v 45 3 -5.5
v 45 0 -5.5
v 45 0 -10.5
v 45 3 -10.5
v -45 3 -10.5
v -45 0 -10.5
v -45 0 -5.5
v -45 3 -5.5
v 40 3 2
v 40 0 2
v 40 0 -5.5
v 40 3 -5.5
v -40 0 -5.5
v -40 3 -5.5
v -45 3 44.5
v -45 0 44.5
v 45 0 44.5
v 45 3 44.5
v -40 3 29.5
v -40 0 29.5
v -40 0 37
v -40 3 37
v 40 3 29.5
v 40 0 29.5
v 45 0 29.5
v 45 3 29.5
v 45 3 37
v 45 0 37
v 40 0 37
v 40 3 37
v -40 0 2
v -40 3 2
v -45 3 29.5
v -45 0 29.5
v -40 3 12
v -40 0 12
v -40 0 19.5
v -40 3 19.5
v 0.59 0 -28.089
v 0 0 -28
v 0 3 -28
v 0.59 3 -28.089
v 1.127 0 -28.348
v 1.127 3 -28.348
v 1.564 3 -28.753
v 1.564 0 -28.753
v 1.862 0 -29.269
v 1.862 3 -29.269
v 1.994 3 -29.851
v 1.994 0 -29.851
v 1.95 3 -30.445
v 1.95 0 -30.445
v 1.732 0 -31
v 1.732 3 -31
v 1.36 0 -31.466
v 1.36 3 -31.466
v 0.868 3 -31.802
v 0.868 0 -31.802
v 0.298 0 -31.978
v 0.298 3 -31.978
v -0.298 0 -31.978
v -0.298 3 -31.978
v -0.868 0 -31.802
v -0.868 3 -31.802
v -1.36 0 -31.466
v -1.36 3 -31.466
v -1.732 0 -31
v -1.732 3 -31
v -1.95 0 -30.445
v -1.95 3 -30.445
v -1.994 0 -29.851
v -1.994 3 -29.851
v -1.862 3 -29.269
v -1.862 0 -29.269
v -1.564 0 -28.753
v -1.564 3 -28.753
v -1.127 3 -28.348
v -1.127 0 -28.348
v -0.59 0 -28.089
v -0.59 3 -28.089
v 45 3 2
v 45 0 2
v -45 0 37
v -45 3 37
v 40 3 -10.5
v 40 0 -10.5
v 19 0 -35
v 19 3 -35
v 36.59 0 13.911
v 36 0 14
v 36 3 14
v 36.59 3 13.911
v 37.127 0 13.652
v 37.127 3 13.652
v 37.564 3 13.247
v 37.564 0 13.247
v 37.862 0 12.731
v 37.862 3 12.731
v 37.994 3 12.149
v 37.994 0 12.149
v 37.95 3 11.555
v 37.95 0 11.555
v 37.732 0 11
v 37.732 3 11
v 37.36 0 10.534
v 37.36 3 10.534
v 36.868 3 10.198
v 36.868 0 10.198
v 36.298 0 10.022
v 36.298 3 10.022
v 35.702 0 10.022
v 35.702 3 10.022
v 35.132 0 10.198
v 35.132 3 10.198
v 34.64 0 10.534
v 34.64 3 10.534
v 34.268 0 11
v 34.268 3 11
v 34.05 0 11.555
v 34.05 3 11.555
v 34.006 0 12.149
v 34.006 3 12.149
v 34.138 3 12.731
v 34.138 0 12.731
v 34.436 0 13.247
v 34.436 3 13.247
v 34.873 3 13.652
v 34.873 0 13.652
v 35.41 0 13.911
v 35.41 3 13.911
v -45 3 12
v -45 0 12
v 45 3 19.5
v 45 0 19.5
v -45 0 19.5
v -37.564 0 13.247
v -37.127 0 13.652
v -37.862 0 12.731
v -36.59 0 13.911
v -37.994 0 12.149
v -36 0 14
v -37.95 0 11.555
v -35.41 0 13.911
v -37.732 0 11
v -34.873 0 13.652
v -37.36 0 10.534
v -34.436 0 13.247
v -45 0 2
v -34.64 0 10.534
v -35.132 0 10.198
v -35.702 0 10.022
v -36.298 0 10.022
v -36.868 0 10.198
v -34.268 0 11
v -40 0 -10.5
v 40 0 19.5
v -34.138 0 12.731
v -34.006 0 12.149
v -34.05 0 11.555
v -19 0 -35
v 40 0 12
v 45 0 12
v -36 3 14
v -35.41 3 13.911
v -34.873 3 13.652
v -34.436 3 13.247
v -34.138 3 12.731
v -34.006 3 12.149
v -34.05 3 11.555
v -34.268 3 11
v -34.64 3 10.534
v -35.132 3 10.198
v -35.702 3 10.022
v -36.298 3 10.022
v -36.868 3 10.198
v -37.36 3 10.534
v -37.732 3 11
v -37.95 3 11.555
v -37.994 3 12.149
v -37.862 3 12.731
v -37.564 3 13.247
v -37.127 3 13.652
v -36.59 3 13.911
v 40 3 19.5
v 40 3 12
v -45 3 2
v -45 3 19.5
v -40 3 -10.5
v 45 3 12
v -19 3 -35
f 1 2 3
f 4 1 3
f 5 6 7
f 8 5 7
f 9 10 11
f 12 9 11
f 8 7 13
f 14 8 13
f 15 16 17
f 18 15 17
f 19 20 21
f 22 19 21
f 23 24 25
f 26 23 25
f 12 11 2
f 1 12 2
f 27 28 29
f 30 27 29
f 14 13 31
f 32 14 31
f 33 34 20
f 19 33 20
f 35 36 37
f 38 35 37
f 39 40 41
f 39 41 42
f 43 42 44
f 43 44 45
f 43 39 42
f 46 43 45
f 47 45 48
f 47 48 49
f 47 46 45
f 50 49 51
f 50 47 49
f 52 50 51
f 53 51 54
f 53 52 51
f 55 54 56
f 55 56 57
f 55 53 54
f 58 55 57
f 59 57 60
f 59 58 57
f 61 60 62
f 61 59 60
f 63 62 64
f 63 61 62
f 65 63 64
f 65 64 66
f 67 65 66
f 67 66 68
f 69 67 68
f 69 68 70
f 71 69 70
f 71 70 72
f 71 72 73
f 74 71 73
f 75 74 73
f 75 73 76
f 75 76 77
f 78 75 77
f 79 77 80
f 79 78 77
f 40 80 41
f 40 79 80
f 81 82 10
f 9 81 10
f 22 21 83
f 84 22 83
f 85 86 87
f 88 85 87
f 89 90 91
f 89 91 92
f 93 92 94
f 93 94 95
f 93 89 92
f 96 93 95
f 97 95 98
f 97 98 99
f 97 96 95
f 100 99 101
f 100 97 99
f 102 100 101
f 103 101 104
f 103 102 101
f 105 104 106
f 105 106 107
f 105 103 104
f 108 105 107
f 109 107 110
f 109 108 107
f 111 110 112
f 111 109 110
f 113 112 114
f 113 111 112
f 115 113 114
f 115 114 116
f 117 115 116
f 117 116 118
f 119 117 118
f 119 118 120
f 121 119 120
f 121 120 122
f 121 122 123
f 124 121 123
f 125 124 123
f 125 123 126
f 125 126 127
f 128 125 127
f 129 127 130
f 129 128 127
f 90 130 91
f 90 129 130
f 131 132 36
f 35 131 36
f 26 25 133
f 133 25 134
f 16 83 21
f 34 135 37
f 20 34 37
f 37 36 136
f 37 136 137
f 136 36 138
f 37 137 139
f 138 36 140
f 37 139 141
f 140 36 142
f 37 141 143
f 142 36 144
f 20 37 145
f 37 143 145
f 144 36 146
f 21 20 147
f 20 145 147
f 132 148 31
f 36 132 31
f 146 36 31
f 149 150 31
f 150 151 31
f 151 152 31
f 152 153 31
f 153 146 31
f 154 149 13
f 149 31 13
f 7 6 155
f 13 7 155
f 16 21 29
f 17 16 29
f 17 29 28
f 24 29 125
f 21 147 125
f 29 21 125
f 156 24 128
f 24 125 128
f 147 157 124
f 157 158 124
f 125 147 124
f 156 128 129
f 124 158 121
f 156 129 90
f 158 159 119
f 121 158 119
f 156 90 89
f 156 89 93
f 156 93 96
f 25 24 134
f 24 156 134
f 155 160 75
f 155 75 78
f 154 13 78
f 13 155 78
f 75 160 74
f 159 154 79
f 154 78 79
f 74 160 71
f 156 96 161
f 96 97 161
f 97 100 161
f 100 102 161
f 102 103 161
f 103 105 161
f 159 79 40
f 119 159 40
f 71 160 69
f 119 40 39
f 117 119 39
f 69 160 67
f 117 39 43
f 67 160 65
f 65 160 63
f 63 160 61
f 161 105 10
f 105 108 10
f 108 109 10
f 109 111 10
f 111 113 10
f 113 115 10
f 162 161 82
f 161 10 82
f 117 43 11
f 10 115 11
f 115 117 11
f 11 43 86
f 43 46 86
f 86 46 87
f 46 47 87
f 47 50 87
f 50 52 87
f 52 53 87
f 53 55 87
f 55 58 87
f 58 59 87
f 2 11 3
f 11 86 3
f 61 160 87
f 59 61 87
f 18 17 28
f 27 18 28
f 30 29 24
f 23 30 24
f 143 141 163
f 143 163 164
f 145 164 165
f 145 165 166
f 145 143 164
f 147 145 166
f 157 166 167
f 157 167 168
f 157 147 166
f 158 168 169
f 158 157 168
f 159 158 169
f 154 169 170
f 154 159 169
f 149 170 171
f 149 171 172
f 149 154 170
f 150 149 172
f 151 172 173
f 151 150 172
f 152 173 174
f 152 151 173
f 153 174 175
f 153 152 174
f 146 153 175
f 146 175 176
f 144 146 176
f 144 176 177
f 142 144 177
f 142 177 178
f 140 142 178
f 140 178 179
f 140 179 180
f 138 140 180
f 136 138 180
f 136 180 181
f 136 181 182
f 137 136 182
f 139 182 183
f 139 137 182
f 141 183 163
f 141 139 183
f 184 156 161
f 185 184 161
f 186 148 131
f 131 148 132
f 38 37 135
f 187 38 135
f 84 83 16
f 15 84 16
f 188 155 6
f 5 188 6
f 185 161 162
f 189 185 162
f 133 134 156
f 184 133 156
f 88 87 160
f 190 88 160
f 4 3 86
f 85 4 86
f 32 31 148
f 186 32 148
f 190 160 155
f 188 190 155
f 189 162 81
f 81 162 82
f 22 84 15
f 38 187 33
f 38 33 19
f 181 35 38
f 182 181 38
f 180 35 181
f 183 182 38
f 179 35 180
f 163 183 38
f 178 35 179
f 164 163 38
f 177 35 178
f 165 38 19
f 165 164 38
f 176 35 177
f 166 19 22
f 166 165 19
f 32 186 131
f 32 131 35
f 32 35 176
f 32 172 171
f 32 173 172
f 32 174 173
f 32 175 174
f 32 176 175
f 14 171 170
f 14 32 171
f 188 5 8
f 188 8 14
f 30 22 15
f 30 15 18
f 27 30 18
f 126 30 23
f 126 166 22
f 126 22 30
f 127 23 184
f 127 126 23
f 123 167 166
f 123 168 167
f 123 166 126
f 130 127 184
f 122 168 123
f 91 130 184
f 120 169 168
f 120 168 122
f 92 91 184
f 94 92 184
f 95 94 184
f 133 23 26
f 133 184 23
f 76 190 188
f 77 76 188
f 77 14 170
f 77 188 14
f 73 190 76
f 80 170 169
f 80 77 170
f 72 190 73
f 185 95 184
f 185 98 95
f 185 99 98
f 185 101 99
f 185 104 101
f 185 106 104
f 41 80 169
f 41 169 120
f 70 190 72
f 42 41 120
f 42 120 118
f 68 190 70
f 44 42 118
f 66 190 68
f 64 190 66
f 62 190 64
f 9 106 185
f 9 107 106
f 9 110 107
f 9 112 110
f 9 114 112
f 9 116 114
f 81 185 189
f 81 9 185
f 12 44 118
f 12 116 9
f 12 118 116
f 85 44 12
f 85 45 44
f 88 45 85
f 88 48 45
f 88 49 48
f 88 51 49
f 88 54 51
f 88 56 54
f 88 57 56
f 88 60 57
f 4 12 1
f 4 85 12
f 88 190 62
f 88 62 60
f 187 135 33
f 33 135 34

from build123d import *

# Parameters (mm, degrees)
SKETCH1_R           = 2
BOSS_EXTRUDE1_DEPTH = 3


with BuildPart() as part:
    # Sketch1 → Boss-Extrude1 (new body)
    with BuildSketch(Plane(origin=(0, 0, 0), x_dir=(1, 0, 0), z_dir=(0, 1, 0))):
        Polygon((-19, 35), (-40, 10.5), (-45, 10.5), (-45, 5.5), (-40, 5.5), (-40, -2), (-45, -2), (-45, -12), (-40, -12), (-40, -19.5), (-45, -19.5), (-45, -29.5), (-40, -29.5), (-40, -37), (-45, -37), (-45, -44.5), (-40, -44.5), (40, -44.5), (45, -44.5), (45, -37), (40, -37), (40, -29.5), (45, -29.5), (45, -19.5), (40, -19.5), (40, -12), (45, -12), (45, -2), (40, -2), (40, 5.5), (45, 5.5), (45, 10.5), (40, 10.5), (19, 35), align=None)
        with Locations(Location((-36, -12, 0), (0, 0, 270))):
            Circle(SKETCH1_R, mode=Mode.SUBTRACT)
        with Locations(Location((36, -12, 0), (0, 0, 270))):
            Circle(SKETCH1_R, mode=Mode.SUBTRACT)
        with Locations(Location((0, 30, 0), (0, 0, 270))):
            Circle(SKETCH1_R, mode=Mode.SUBTRACT)
    extrude(amount=BOSS_EXTRUDE1_DEPTH)


solid = part.part
